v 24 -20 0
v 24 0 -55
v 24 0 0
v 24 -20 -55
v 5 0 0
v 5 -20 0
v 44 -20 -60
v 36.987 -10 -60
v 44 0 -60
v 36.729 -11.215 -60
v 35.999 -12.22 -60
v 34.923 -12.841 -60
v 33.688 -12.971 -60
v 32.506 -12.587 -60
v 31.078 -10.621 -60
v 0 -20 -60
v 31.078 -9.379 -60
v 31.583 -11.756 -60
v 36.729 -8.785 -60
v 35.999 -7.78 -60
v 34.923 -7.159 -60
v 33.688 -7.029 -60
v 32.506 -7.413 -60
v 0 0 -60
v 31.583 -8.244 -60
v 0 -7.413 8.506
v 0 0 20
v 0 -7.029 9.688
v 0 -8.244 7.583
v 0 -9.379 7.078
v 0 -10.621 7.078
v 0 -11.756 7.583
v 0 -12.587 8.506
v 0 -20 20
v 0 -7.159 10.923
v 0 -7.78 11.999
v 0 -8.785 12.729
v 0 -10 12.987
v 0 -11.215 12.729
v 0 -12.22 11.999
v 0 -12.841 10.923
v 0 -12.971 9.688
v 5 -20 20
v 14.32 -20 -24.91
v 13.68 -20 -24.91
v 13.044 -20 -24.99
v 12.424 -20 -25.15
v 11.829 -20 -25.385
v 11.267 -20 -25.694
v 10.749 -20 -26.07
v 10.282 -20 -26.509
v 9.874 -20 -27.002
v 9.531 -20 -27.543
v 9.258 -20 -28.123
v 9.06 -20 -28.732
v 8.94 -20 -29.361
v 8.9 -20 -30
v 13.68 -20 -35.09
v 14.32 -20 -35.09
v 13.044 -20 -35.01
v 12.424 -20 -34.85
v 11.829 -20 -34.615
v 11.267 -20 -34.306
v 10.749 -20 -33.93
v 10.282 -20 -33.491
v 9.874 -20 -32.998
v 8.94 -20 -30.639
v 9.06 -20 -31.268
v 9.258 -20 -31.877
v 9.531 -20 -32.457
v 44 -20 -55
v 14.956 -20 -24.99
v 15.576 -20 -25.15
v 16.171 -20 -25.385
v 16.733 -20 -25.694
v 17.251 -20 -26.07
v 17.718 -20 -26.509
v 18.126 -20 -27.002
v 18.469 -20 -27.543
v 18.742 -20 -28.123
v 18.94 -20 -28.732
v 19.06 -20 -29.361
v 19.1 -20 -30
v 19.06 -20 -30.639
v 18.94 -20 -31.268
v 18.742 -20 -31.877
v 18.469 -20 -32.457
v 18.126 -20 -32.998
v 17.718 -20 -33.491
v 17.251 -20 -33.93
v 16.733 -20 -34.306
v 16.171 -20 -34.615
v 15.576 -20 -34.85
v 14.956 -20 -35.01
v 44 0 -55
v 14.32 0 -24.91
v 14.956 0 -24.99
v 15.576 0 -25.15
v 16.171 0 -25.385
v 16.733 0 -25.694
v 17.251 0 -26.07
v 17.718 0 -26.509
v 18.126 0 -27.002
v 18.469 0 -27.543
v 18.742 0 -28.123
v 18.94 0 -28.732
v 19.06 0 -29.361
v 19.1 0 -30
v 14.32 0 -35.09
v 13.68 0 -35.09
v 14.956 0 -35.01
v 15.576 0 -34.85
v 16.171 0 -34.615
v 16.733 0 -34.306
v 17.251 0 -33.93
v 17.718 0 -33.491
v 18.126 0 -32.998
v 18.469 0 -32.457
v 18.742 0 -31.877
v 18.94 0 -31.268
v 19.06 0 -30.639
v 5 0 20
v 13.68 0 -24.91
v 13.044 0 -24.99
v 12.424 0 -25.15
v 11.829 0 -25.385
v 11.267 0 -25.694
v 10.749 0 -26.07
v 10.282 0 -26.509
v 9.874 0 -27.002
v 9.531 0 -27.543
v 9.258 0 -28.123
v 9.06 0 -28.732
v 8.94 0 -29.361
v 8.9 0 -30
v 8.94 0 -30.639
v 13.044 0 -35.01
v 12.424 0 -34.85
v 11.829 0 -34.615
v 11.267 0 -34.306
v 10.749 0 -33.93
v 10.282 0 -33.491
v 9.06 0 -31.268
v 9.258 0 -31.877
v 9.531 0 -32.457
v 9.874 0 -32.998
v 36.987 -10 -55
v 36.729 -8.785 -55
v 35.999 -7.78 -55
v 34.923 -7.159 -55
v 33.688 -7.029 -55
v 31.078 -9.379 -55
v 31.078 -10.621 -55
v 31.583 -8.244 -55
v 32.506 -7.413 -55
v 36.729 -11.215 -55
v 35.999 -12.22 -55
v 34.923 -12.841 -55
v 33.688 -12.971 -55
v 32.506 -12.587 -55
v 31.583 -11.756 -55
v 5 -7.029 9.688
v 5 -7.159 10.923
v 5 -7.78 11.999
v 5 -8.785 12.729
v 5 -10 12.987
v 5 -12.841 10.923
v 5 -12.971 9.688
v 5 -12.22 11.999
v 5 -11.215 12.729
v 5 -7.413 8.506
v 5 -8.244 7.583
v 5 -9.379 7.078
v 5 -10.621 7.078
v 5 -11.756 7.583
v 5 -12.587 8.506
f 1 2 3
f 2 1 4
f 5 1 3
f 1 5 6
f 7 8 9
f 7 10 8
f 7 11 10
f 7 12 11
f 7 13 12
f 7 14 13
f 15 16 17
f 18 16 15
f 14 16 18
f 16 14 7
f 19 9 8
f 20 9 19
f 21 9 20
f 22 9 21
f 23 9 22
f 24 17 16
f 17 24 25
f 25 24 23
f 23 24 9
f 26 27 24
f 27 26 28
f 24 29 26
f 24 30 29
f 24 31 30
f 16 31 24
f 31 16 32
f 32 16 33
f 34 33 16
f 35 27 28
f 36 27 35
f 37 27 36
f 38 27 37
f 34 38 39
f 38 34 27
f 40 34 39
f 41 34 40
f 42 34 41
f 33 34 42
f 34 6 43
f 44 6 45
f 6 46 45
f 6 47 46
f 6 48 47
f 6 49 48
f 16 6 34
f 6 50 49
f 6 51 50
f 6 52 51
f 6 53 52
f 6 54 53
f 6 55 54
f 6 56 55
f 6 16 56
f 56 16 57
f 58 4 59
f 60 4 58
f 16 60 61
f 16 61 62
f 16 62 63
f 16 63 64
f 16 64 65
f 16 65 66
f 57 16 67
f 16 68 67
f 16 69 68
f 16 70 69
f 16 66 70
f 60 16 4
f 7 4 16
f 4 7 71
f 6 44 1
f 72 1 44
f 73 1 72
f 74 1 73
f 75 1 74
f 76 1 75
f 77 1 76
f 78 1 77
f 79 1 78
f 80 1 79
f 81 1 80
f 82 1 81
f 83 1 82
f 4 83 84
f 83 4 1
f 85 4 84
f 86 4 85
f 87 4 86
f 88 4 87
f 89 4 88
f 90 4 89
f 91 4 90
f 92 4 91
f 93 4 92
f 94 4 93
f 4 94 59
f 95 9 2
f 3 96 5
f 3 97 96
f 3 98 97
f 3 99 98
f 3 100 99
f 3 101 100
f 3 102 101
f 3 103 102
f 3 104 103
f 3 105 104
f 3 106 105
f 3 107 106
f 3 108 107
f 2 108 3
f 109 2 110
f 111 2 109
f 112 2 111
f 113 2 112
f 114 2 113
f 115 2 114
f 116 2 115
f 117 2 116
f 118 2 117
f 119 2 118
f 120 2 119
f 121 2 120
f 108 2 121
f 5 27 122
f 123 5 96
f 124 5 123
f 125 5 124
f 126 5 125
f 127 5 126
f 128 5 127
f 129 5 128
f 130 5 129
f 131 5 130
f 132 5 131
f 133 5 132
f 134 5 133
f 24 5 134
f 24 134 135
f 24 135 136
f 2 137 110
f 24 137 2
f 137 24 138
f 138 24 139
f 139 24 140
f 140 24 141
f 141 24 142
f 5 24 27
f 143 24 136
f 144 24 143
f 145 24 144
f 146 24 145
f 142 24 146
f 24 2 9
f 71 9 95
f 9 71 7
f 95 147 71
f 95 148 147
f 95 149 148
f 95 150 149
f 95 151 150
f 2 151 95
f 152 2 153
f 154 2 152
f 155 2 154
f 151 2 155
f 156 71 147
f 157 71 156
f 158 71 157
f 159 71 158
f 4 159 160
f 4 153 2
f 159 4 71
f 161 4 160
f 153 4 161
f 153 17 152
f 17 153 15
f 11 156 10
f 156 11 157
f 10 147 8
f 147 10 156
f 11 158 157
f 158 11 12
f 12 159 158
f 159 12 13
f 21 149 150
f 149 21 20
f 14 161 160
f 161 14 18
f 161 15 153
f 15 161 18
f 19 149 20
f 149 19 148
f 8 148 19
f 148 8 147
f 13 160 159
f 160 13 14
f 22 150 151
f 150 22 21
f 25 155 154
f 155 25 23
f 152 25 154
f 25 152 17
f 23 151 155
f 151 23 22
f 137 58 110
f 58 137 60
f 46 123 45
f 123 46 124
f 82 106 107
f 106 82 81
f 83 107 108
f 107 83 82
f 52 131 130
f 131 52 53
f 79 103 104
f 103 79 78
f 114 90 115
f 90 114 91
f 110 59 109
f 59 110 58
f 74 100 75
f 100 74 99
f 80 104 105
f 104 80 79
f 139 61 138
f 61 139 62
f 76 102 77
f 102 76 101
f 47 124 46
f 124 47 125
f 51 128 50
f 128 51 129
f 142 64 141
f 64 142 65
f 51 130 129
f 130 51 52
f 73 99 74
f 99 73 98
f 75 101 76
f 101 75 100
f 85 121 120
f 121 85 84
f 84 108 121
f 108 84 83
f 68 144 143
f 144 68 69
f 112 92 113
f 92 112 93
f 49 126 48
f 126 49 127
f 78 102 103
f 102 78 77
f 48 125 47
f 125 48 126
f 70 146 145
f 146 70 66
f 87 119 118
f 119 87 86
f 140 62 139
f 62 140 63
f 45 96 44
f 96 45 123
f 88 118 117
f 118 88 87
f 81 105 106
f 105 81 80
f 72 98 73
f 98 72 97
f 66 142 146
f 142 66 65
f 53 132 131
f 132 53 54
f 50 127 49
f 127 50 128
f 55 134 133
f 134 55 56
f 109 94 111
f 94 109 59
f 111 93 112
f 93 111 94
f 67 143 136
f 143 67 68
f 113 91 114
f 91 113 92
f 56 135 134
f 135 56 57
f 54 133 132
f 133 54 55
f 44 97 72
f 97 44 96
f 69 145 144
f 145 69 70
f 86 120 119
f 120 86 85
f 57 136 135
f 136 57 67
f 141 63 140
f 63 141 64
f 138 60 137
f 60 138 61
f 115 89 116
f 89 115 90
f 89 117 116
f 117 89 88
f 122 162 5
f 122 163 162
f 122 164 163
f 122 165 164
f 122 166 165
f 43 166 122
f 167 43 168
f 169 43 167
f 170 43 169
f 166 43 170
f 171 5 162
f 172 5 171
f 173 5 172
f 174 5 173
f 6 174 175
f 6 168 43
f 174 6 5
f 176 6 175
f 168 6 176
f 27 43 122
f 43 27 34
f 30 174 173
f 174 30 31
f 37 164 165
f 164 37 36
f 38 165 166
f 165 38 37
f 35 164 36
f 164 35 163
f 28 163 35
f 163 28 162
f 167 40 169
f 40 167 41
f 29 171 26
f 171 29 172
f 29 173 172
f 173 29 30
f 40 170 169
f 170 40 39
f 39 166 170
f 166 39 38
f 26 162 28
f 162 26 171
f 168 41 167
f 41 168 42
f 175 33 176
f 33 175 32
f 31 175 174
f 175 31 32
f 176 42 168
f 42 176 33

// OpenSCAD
// file: sub_front_pulleys.scad
include <nuts_and_bolts.scad>;
include <generals.scad>;

pulley_plate_x = 45;
pulley_plate_y = 28;

pulley_arm_x = pulley_plate_x + alu_x;
pulley_arm_y = pulley_plate_y + alu_x;

module front_pulley(lower = false, left = false)
{
    echo("FP:", lower, left);
	difference()
	{
		union()
		{
			translate([-alu_x, 0, 0]) cube([pulley_arm_x, alu_x, wall]);
			translate([-alu_x, -pulley_arm_y+alu_x, 0]) cube([alu_x, pulley_arm_y, wall]);
			translate([0, -pulley_plate_y, lower ? 0 : wall-thin_wall ]) cube([pulley_plate_x, pulley_plate_y, lower ? wall : thin_wall ]); //lower ? 0 : wall-thin_wall 

        /*    if (lower)
            {
                if(left)
                {
                    translate([hole_dist_1, -hole_dist_1, wall-1]) cylinder(h=alu_x+(wall-thin_wall)-bearing_pulley_h-2*belt_z_offset+1, d=pulley_b_d);
                }
                
                if (!left)
                {
                    translate([hole_dist_2+hole_x_offset, -hole_dist_2, wall-1]) cylinder(h=pulley_s_base_h+1, d=pulley_b_d-3.4);
                }
            }
        */
            if (!lower)
            {
                if(left)
                {
                    translate([hole_dist_2+hole_x_offset, -hole_dist_2, -(alu_x-bearing_pulley_h-2*belt_z_offset)]) cylinder(h=alu_x+wall-thin_wall-bearing_pulley_h-2*belt_z_offset+1, d=pulley_b_d-3.4);
                }
                
                if (!left)
                {
                    translate([hole_dist_1, -hole_dist_1, -(alu_x-bearing_pulley_h-2*belt_z_offset)]) cylinder(h=alu_x+thin_wall-bearing_pulley_h-2*belt_z_offset+1, d=pulley_b_d);

                    translate([hole_dist_2+hole_x_offset, -hole_dist_2, -(alu_x-bearing_pulley_h-2*belt_z_offset-pulley_s_base_h)]) cylinder(h=alu_x+wall-thin_wall-bearing_pulley_h-2*belt_z_offset-pulley_s_base_h+1, d=pulley_b_d-3.4);
                }
            }

		}

		translate([(pulley_arm_x - alu_x)*2/3, alu_x/2, -20]) rotate([0, 0, 0]) boltHole(size=bolt,length=40);
		translate([(pulley_arm_x - alu_x)*1/3, alu_x/2, -20]) rotate([0, 0, 0]) boltHole(size=bolt,length=40);
		translate([-alu_x/2, -(pulley_arm_y - alu_x)*2/3-1, -20]) rotate([0, 0, 0]) boltHole(size=bolt,length=40);
		translate([-alu_x/2, -(pulley_arm_y - alu_x)*1/4, -20]) rotate([0, 0, 0]) boltHole(size=bolt,length=40);
		
		translate([hole_dist_1, -hole_dist_1, -20]) boltHole(size=3, length=40);
		translate([hole_dist_2+hole_x_offset, -hole_dist_2, -20]) boltHole(size=3,length=40);
        
		if (lower)
		{
			translate([-alu_x-2+0.1, -0.1, -1]) cube([alu_x+2, alu_x+2, wall+2]);
		}
	}

}

/*
is_left = false;

front_pulley(false, is_left);

translate([0, 0, -alu_x-wall]) front_pulley(true, is_left);
*/
///color([0, 0.2, 0]) translate([hole_dist_1,-hole_dist_1,-pulley_height+2]) pulley();
//color([0, 0.4, 0]) translate([hole_dist_2+hole_x_offset,-hole_dist_2,-4]) mirror([0,0,1])pulley();

//color([0.5,0,0]) translate([30, -40, -alu_x]) cube([20,20,pulley_height+4]);
//color([0,0,0]) translate([5, 10, -alu_x]) cube([20,20,alu_x]);
// file: sub_rod_support.scad
include <nuts_and_bolts.scad>;
include <generals.scad>;

include <sub_front_pulleys.scad>;

y_sup_body_height = alu_x / 2 + wall + y_from_top;
y_sup_body_width = alu_x /2 + y_from_side;
y_back_spacing = -wall;

y_sup_arm_length_x = y_sup_body_width + alu_x;
y_sup_arm_length_z = y_sup_body_height + alu_x;

module rod_support(front = true, support_width = alu_x, support_height = y_sup_body_height, with_bottom = true)
{
	mirror([0, front ? 0 : 1, 0])
	difference()
	{
		union()
		{
			translate([0, 0, -support_height]) cube([y_sup_body_width, alu_x, support_height]);
			
			if (with_bottom)
			{
				translate([0, 0, -y_sup_arm_length_z]) cube([wall, support_width, y_sup_arm_length_z]);
			}
			else
			{
				translate([0, 0, -support_height]) cube([y_sup_body_width + alu_x, alu_x, wall]);
			}
		}

		translate([y_from_side, alu_x+1, -y_from_top-wall]) rotate([90, 0, 0]) cylinder(d = rod_dia + clearance, h = alu_x+2);

		if (with_bottom)
		{
			translate([6, alu_x/2, -y_sup_arm_length_z+(y_sup_arm_length_z-support_height)/2]) rotate([0, -90, 0]) boltHole(size=bolt,length=40);
		}
		else
		{
			translate([y_sup_body_width + alu_x/2, alu_x/2, -support_height-0.5]) rotate([0, 0, 0]) boltHole(bolt, length=wall+1);	
		}
	}
}

//rod_support(support_width=alu_x, with_bottom = true);
//translate([0, 60, 0]) rod_support(false);
// file: nuts_and_bolts.scad
// Copyright 2010 D1plo1d

// This library is dual licensed under the GPL 3.0 and the GNU Lesser General Public License as per http://creativecommons.org/licenses/LGPL/2.1/ .

//testNutsAndBolts();

module SKIPtestNutsAndBolts()
{
	$fn = 360;
	translate([0,15])nutHole(3);
	boltHole(3, length= 30);
}

MM = "mm";
INCH = "inch"; //Not yet supported

//Based on: http://www.roymech.co.uk/Useful_Tables/Screws/Hex_Screws.htm
METRIC_NUT_AC_WIDTHS =
[
	-1, //0 index is not used but reduces computation
	-1,
	-1,
	6.90,//m3
	8.10,//m4
	9.20,//m5
	11.50,//m6
	-1,
	15.50,//m8
	-1,
	19.60,//m10
	-1,
	22.10,//m12
	-1,
	-1,
	-1,
	27.70,//m16
	-1,
	-1,
	-1,
	34.60,//m20
	-1,
	-1,
	-1,
	41.60,//m24
	-1,
	-1,
	-1,
	-1,
	-1,
	53.1,//m30
	-1,
	-1,
	-1,
	-1,
	-1,
	63.5//m36
];
METRIC_NUT_THICKNESS =
[
	-1, //0 index is not used but reduces computation
	-1,
	-1,
	2.40,//m3
	3.20,//m4
	4.00,//m5
	5.00,//m6
	-1,
	6.50,//m8
	-1,
	8.00,//m10
	-1,
	10.00,//m12
	-1,
	-1,
	-1,
	13.00,//m16
	-1,
	-1,
	-1,
	16.00//m20
	-1,
	-1,
	-1,
	19.00,//m24
	-1,
	-1,
	-1,
	-1,
	-1,
	24.00,//m30
	-1,
	-1,
	-1,
	-1,
	-1,
	29.00//m36
];

COURSE_METRIC_BOLT_MAJOR_THREAD_DIAMETERS =
[//based on max values
	-1, //0 index is not used but reduces computation
	-1,
	-1,
	2.98,//m3
	3.978,//m4
	4.976,//m5
	5.974,//m6
	-1,
	7.972,//m8
	-1,
	9.968,//m10
	-1,
	11.966,//m12
	-1,
	-1,
	-1,
	15.962,//m16
	-1,
	-1,
	-1,
	19.958,//m20
	-1,
	-1,
	-1,
	23.952,//m24
	-1,
	-1,
	-1,
	-1,
	-1,
	29.947,//m30
	-1,
	-1,
	-1,
	-1,
	-1,
	35.940//m36
];

module nutHole(size, units=MM, tolerance = +0.0001, proj = -1)
{
	//takes a metric screw/nut size and looksup nut dimensions
	radius = METRIC_NUT_AC_WIDTHS[size]/2+tolerance;
	height = METRIC_NUT_THICKNESS[size]+tolerance;
	if (proj == -1)
	{
		cylinder(r= radius, h=height, $fn = 6, center=[0,0]);
	}
	if (proj == 1)
	{
		circle(r= radius, $fn = 6);
	}
	if (proj == 2)
	{
		translate([-radius/2, 0])
			square([radius*2, height]);
	}
}

module boltHole(size, units=MM, length, tolerance = +0.0001, proj = -1)
{
	radius = COURSE_METRIC_BOLT_MAJOR_THREAD_DIAMETERS[size]/2+tolerance;
//TODO: proper screw cap values
	capHeight = METRIC_NUT_THICKNESS[size]+tolerance; //METRIC_BOLT_CAP_HEIGHTS[size]+tolerance;
	capRadius = METRIC_NUT_AC_WIDTHS[size]/2+tolerance; //METRIC_BOLT_CAP_RADIUS[size]+tolerance;

	if (proj == -1)
	{
	translate([0, 0, -capHeight])
		cylinder(r= capRadius, h=capHeight, $fn=15);
	cylinder(r = radius, h = length, $fn=15);
	}
	if (proj == 1)
	{
		circle(r = radius);
	}
	if (proj == 2)
	{
		translate([-capRadius/2, -capHeight])
			square([capRadius*2, capHeight]);
		square([radius*2, length]);
	}
}

module boltHoleEx(size, units=MM, length, tolerance = +0.0001, shift_x=0, shift_y=0)
{
	radius = COURSE_METRIC_BOLT_MAJOR_THREAD_DIAMETERS[size]/2+tolerance;
//TODO: proper screw cap values
	capHeight = METRIC_NUT_THICKNESS[size]+tolerance; //METRIC_BOLT_CAP_HEIGHTS[size]+tolerance;
	capRadius = METRIC_NUT_AC_WIDTHS[size]/2+tolerance; //METRIC_BOLT_CAP_RADIUS[size]+tolerance;

	hull()
	{
		translate([0, 0, -capHeight]) cylinder(r= capRadius, h=capHeight, $fn=15);
		translate([shift_x, shift_y, -capHeight]) cylinder(r= capRadius, h=capHeight, $fn=15);
	}

	hull()
	{
		cylinder(r = radius, h = length, $fn=15);
		translate([shift_x, shift_y, 0]) cylinder(r = radius, h = length, $fn=15);
	}
}

//boltHoleEx(3, length=6);
// main file
include <nuts_and_bolts.scad>;
include <generals.scad>;

include <sub_rod_support.scad>;
include <sub_front_pulleys.scad>;

y_sup_height_back = y_sup_body_height + 20;

module back_rod_support()
{
	difference()
	{
		union()
		{
			translate([0, -alu_x, 0]) cube([wall, alu_x, alu_x]);
			translate([0, 0, 0]) rod_support(front = false, support_height = y_sup_height_back, with_bottom = false); //, support_width=wall + motor_from_side_y + nema17_side+alu_x+wall_clearance - alu_x);

		}

		translate([wall+0.5, -alu_x/2, alu_x/2]) rotate([0, -90, 0]) boltHole(bolt, length=wall+1);
	}
}

back_rod_support();
